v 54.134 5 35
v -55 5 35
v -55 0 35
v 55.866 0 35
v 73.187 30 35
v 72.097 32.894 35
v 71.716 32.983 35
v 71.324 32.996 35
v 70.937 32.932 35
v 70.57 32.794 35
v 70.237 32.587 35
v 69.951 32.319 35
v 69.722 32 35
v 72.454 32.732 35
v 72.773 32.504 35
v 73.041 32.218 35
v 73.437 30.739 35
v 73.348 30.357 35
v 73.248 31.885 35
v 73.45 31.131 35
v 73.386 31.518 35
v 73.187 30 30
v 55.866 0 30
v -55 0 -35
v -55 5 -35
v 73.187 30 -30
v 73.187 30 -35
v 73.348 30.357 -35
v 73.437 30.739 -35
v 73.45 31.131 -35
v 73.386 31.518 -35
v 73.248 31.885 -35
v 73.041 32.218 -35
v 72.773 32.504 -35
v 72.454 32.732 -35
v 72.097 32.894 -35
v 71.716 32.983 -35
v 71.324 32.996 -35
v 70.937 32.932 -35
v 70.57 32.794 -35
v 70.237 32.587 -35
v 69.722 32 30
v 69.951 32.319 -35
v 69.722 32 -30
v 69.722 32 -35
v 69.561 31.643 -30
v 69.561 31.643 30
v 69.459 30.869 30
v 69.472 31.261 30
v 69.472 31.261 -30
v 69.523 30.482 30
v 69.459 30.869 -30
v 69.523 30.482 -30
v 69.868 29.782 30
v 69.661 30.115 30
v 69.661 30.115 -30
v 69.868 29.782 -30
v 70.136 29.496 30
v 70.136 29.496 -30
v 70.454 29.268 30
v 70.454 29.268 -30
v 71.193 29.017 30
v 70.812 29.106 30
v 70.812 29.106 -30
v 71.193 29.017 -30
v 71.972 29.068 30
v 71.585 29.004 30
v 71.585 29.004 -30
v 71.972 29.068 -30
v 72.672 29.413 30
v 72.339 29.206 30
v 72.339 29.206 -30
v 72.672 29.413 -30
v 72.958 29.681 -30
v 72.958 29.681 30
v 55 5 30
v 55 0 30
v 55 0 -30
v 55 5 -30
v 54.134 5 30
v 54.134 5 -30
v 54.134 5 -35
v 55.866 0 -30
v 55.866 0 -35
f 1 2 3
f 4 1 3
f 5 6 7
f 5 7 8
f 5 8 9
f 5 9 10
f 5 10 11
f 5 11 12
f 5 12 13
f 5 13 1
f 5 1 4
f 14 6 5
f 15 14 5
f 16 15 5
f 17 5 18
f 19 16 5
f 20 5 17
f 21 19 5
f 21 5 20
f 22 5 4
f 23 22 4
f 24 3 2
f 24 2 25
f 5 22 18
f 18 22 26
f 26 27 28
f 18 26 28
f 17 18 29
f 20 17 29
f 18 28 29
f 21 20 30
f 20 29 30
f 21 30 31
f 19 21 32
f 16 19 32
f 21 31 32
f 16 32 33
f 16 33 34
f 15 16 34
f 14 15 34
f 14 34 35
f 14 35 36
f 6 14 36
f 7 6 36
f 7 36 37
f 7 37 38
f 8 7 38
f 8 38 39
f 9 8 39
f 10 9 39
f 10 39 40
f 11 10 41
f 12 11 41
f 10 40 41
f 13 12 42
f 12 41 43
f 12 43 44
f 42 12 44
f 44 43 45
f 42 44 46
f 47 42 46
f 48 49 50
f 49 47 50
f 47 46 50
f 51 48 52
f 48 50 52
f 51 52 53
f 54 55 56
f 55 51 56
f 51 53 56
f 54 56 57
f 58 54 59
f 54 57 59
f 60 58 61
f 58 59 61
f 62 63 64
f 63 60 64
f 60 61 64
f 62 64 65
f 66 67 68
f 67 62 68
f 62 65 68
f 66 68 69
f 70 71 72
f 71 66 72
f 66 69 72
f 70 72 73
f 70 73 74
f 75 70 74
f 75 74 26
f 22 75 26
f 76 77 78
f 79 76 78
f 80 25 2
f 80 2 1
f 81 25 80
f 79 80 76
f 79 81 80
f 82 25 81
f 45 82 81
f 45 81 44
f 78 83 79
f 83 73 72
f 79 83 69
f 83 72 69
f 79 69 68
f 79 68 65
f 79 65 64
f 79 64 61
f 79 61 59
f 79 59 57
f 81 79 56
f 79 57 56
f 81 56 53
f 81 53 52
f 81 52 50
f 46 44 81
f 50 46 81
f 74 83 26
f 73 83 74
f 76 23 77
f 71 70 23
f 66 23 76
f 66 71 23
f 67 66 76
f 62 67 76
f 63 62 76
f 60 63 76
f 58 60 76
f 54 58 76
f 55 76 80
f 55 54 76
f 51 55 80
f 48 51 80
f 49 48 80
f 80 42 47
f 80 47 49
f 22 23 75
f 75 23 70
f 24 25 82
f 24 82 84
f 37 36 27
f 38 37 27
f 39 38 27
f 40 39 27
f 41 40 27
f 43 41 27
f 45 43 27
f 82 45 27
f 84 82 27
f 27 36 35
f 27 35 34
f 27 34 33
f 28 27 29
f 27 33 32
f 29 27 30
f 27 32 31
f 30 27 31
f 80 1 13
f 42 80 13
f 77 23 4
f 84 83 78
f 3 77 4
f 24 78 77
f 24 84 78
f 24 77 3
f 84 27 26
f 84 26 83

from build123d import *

# Parameters (mm, degrees)
SKETCH1_W           = 110
SKETCH1_H           = 70
BOSS_EXTRUDE1_DEPTH = 5
BOSS_EXTRUDE2_DEPTH = 5
BOSS_EXTRUDE3_DEPTH = 5
BOSS_EXTRUDE4_START = -70
SKETCH4_R           = 2
BOSS_EXTRUDE4_DEPTH = 70


with BuildPart() as part:
    # Sketch1 → Boss-Extrude1 (new body)
    with BuildSketch(Plane(origin=(0, 0, 0), x_dir=(1, 0, 0), z_dir=(0, 1, 0))):
        Rectangle(SKETCH1_W, SKETCH1_H)
    extrude(amount=BOSS_EXTRUDE1_DEPTH)

    # Sketch2 → Boss-Extrude2 (add)
    with BuildSketch(Plane.XY.offset(35)):
        Polygon((69.722431864, 32), (73.186533479, 30), (55.866025404, 0), (55, 0), (55, 5), (54.133974596, 5), align=None)
    extrude(amount=-BOSS_EXTRUDE2_DEPTH)

    # Sketch3 → Boss-Extrude3 (add)
    with BuildSketch(Plane(origin=(0, 0, -35), x_dir=(-1, 0, 0), z_dir=(0, 0, -1))):
        Polygon((-54.133974596, 5), (-69.722431864, 32), (-73.186533479, 30), (-55.866025404, 0), (-55, 0), (-55, 5), align=None)
    extrude(amount=-BOSS_EXTRUDE3_DEPTH)

    # Sketch4 → Boss-Extrude4 (add)
    with BuildSketch(Plane.XY.offset(35).offset(BOSS_EXTRUDE4_START)):
        with Locations(Location((71.454482672, 31, 0), (0, 0, 330))):
            Circle(SKETCH4_R)
    extrude(amount=BOSS_EXTRUDE4_DEPTH)


solid = part.part
